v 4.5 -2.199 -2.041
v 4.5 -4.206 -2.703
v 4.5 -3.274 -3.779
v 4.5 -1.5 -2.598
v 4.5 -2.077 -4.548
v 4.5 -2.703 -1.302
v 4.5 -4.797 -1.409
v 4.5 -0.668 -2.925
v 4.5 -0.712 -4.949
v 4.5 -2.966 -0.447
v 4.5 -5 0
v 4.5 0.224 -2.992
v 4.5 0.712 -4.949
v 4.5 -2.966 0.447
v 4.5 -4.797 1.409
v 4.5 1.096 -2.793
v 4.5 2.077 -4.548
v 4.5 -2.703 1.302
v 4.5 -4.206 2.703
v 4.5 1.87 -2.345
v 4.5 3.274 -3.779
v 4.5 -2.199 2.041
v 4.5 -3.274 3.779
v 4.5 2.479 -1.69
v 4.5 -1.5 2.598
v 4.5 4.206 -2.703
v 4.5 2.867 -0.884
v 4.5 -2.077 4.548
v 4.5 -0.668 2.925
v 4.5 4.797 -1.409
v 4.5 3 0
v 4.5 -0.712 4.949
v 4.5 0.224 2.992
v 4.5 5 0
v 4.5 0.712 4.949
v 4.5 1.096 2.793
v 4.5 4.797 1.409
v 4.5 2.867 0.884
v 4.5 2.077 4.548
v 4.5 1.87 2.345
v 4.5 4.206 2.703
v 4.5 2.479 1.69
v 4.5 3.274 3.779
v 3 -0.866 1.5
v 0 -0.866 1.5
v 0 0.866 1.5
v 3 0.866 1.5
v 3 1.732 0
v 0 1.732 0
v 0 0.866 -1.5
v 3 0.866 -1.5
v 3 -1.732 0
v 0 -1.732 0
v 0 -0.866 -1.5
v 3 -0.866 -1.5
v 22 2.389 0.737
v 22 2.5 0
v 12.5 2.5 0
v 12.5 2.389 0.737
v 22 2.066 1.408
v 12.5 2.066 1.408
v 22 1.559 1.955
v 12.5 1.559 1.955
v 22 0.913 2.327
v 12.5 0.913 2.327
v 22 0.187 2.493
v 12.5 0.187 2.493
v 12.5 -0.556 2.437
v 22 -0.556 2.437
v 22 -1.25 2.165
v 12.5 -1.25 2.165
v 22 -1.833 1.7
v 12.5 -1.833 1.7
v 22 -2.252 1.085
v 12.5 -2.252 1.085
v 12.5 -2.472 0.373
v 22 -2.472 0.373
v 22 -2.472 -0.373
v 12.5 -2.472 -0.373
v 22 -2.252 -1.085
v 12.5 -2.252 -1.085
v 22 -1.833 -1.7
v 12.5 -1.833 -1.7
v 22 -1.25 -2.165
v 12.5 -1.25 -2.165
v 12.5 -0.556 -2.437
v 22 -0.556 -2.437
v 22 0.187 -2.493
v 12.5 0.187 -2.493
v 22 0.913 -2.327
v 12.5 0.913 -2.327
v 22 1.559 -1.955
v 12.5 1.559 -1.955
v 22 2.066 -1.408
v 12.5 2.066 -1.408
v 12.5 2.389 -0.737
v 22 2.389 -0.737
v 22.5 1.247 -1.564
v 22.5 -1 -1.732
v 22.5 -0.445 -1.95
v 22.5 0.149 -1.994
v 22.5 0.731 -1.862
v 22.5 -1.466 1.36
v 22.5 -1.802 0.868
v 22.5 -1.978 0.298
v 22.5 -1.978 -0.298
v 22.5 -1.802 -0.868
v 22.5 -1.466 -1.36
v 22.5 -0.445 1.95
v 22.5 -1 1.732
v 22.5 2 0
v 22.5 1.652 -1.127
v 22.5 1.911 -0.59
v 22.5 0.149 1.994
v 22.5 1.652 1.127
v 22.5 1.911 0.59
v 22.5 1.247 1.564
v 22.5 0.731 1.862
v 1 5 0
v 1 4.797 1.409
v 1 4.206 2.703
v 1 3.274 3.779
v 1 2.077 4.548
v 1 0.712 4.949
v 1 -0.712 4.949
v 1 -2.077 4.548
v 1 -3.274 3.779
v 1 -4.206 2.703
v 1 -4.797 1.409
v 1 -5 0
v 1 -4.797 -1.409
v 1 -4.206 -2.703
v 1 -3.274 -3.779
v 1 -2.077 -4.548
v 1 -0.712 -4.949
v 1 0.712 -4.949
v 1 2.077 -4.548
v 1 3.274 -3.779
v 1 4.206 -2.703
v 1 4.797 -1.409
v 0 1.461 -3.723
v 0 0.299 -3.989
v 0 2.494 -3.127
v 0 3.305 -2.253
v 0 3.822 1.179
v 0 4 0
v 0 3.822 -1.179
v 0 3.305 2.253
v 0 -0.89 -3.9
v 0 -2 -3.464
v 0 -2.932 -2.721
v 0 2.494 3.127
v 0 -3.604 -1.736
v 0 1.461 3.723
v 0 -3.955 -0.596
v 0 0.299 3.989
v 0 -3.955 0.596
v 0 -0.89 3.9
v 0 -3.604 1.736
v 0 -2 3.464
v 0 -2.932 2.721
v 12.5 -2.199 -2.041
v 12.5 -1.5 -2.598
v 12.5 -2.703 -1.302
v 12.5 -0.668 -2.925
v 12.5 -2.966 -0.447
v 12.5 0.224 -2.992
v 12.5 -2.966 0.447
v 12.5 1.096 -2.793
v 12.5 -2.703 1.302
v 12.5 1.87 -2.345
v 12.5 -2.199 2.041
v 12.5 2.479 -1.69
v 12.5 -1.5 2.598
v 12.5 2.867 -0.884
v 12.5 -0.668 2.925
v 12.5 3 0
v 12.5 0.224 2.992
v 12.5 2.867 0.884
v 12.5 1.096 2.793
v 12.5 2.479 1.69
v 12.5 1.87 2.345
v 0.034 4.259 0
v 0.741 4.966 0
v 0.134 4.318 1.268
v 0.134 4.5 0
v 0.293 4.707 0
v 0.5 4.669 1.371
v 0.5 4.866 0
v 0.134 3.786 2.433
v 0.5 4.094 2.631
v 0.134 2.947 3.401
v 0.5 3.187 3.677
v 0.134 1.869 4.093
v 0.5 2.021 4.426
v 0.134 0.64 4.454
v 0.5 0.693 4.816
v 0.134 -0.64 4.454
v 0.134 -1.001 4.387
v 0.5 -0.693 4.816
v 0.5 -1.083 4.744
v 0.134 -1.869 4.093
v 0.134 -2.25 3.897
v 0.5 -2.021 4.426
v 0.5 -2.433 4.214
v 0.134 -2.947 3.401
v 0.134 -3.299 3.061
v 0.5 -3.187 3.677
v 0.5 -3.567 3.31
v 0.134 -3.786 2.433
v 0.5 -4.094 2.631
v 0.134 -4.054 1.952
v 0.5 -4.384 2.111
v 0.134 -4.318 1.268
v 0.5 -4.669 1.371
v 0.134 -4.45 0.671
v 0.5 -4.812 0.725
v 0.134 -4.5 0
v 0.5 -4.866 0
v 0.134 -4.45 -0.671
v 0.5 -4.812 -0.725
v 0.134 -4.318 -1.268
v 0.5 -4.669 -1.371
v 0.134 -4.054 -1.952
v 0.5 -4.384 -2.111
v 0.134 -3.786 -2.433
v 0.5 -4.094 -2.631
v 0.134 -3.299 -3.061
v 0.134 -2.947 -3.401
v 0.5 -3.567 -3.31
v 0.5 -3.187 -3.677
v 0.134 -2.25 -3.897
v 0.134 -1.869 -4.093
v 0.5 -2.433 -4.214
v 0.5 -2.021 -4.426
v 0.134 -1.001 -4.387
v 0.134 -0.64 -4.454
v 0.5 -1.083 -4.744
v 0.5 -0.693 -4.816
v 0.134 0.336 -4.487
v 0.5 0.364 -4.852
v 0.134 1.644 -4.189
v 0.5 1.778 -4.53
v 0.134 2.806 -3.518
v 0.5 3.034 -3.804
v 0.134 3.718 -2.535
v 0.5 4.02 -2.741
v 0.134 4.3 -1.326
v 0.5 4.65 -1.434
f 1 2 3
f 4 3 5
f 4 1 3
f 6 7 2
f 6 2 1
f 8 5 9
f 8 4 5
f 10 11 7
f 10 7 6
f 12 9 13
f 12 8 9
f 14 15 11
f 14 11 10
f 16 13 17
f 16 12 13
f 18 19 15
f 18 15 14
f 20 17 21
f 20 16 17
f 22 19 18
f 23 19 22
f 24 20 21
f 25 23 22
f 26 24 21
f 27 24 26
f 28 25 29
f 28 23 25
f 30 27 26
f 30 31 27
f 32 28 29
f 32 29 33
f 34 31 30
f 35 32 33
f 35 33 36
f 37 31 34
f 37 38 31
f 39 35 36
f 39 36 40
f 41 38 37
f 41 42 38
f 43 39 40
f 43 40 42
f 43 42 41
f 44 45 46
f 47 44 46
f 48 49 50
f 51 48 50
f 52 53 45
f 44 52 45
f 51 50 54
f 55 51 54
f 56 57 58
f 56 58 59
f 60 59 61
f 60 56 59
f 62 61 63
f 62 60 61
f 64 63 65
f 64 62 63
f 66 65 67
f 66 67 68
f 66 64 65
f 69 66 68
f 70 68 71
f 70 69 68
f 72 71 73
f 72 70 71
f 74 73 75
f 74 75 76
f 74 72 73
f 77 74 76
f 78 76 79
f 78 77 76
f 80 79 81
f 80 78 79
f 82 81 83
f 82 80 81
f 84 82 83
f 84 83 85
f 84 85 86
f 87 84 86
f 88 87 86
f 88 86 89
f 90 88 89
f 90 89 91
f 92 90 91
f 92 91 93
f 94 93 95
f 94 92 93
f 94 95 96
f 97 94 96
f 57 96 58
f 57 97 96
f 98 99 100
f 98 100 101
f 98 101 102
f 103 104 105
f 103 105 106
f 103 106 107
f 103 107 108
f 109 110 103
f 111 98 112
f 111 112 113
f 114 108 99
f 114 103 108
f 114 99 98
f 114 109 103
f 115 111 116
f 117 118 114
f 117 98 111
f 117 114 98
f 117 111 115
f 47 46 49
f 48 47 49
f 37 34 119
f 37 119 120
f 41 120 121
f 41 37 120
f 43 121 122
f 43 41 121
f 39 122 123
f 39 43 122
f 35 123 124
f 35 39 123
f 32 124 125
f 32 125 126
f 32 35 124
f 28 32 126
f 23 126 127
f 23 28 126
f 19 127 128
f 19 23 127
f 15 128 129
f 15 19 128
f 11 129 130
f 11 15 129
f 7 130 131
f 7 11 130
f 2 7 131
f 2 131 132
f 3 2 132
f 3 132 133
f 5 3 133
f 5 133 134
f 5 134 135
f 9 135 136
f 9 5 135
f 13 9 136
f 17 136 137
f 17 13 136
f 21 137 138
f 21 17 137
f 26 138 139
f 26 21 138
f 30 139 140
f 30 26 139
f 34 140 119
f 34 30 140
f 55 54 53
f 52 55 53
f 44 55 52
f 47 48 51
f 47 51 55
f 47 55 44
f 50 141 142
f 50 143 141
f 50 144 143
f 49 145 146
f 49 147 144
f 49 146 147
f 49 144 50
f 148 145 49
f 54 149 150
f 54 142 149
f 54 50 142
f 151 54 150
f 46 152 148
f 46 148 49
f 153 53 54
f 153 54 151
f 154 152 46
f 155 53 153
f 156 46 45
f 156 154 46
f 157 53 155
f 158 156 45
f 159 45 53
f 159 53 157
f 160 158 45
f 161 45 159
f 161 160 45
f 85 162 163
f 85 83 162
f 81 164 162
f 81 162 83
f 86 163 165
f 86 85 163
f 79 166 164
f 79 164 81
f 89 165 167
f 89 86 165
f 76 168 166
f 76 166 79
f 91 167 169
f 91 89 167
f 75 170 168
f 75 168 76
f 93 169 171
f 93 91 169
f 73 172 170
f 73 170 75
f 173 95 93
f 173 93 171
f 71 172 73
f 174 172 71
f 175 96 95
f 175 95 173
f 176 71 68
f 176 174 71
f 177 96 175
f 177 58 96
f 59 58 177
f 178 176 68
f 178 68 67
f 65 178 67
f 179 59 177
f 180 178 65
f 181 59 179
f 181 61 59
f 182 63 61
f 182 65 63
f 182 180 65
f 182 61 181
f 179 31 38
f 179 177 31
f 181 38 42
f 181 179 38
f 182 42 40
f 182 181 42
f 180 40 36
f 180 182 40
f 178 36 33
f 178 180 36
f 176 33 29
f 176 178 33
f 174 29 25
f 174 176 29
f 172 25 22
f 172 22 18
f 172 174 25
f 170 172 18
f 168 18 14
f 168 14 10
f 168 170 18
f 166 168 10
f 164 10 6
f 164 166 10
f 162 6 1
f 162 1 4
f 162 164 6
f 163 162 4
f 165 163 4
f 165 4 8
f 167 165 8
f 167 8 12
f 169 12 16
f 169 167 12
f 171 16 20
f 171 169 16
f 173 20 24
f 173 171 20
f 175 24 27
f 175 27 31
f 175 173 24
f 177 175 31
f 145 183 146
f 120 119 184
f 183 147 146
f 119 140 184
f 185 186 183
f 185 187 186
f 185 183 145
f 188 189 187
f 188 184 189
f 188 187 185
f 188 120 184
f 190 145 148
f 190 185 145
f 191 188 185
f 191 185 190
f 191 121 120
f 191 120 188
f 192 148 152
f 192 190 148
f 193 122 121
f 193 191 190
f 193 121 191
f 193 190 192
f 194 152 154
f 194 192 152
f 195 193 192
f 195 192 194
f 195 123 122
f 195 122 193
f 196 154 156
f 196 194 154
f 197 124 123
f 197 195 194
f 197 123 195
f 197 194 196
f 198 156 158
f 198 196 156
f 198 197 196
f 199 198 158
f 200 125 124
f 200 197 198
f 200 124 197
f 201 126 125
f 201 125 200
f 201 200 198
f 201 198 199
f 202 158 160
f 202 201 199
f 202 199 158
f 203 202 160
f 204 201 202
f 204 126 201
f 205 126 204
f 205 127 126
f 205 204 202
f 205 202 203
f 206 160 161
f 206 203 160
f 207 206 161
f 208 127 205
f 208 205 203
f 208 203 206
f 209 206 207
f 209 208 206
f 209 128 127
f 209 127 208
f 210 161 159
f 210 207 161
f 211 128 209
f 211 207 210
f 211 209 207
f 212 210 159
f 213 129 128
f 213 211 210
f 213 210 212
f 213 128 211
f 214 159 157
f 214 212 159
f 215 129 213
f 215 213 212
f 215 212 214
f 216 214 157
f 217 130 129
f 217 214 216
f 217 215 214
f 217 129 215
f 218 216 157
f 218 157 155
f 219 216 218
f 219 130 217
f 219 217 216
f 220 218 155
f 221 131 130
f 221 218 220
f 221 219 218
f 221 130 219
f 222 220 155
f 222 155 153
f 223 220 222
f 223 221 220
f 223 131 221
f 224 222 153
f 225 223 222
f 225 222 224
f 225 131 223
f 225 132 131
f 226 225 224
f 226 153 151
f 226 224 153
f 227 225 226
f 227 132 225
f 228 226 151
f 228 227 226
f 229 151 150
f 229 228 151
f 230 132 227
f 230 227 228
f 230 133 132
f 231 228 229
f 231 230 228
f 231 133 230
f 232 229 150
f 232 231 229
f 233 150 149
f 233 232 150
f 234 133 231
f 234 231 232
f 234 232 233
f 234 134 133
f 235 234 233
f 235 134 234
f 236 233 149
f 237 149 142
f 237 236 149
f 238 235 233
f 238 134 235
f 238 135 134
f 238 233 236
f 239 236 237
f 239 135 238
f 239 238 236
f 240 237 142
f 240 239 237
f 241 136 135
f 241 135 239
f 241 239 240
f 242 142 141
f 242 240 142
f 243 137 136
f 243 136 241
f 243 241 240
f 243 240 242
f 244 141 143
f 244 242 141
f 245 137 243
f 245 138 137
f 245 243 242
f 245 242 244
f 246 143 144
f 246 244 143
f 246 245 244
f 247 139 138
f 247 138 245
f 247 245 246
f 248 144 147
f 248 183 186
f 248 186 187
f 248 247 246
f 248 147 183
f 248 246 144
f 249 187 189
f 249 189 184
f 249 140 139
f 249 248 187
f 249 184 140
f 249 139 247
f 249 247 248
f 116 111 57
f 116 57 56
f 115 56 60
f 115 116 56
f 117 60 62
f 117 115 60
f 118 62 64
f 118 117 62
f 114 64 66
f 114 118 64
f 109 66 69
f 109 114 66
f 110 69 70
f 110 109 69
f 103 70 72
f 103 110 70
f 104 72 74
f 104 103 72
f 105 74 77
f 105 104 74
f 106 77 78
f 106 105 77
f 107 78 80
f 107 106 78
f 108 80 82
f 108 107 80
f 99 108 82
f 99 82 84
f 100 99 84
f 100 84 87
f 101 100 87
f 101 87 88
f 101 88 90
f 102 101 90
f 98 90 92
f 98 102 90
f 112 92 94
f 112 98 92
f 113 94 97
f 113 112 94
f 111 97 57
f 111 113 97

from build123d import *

# Parameters (mm, degrees)
CUT_EXTRUDE_1_DEPTH = 3
FILLET_1_R          = 1
CHAMFER_1_SIZE      = 0.5


with BuildPart() as part:
    # 草图1 → 旋转1 (revolve)
    with BuildSketch(Plane.XY):
        Polygon((0, 0), (0, 5), (4.5, 5), (4.5, 3), (12.5, 3), (12.5, 2.5), (22.5, 2.5), (22.5, 0), align=None)
    revolve(axis=Axis((0, 0, 0), (1, 0, 0)))

    # 草图2 → 切除-拉伸1 (cut)
    with BuildSketch(Plane.ZY):
        Polygon((0, 1.732050808), (-1.5, 0.866025404), (-1.5, -0.866025404), (0, -1.732050808), (1.5, -0.866025404), (1.5, 0.866025404), align=None)
    extrude(amount=-CUT_EXTRUDE_1_DEPTH, mode=Mode.SUBTRACT)

    # 圆角1
    fillet_1_edges = [part.edges().sort_by_distance(p)[0] for p in [
        (0, -5, 0),
    ]]
    fillet(fillet_1_edges, radius=FILLET_1_R)

    # 倒角1
    chamfer_1_edges = [part.edges().sort_by_distance(p)[0] for p in [
        (22.5, -2.5, 0),
    ]]
    chamfer(chamfer_1_edges, length=CHAMFER_1_SIZE)


solid = part.part
